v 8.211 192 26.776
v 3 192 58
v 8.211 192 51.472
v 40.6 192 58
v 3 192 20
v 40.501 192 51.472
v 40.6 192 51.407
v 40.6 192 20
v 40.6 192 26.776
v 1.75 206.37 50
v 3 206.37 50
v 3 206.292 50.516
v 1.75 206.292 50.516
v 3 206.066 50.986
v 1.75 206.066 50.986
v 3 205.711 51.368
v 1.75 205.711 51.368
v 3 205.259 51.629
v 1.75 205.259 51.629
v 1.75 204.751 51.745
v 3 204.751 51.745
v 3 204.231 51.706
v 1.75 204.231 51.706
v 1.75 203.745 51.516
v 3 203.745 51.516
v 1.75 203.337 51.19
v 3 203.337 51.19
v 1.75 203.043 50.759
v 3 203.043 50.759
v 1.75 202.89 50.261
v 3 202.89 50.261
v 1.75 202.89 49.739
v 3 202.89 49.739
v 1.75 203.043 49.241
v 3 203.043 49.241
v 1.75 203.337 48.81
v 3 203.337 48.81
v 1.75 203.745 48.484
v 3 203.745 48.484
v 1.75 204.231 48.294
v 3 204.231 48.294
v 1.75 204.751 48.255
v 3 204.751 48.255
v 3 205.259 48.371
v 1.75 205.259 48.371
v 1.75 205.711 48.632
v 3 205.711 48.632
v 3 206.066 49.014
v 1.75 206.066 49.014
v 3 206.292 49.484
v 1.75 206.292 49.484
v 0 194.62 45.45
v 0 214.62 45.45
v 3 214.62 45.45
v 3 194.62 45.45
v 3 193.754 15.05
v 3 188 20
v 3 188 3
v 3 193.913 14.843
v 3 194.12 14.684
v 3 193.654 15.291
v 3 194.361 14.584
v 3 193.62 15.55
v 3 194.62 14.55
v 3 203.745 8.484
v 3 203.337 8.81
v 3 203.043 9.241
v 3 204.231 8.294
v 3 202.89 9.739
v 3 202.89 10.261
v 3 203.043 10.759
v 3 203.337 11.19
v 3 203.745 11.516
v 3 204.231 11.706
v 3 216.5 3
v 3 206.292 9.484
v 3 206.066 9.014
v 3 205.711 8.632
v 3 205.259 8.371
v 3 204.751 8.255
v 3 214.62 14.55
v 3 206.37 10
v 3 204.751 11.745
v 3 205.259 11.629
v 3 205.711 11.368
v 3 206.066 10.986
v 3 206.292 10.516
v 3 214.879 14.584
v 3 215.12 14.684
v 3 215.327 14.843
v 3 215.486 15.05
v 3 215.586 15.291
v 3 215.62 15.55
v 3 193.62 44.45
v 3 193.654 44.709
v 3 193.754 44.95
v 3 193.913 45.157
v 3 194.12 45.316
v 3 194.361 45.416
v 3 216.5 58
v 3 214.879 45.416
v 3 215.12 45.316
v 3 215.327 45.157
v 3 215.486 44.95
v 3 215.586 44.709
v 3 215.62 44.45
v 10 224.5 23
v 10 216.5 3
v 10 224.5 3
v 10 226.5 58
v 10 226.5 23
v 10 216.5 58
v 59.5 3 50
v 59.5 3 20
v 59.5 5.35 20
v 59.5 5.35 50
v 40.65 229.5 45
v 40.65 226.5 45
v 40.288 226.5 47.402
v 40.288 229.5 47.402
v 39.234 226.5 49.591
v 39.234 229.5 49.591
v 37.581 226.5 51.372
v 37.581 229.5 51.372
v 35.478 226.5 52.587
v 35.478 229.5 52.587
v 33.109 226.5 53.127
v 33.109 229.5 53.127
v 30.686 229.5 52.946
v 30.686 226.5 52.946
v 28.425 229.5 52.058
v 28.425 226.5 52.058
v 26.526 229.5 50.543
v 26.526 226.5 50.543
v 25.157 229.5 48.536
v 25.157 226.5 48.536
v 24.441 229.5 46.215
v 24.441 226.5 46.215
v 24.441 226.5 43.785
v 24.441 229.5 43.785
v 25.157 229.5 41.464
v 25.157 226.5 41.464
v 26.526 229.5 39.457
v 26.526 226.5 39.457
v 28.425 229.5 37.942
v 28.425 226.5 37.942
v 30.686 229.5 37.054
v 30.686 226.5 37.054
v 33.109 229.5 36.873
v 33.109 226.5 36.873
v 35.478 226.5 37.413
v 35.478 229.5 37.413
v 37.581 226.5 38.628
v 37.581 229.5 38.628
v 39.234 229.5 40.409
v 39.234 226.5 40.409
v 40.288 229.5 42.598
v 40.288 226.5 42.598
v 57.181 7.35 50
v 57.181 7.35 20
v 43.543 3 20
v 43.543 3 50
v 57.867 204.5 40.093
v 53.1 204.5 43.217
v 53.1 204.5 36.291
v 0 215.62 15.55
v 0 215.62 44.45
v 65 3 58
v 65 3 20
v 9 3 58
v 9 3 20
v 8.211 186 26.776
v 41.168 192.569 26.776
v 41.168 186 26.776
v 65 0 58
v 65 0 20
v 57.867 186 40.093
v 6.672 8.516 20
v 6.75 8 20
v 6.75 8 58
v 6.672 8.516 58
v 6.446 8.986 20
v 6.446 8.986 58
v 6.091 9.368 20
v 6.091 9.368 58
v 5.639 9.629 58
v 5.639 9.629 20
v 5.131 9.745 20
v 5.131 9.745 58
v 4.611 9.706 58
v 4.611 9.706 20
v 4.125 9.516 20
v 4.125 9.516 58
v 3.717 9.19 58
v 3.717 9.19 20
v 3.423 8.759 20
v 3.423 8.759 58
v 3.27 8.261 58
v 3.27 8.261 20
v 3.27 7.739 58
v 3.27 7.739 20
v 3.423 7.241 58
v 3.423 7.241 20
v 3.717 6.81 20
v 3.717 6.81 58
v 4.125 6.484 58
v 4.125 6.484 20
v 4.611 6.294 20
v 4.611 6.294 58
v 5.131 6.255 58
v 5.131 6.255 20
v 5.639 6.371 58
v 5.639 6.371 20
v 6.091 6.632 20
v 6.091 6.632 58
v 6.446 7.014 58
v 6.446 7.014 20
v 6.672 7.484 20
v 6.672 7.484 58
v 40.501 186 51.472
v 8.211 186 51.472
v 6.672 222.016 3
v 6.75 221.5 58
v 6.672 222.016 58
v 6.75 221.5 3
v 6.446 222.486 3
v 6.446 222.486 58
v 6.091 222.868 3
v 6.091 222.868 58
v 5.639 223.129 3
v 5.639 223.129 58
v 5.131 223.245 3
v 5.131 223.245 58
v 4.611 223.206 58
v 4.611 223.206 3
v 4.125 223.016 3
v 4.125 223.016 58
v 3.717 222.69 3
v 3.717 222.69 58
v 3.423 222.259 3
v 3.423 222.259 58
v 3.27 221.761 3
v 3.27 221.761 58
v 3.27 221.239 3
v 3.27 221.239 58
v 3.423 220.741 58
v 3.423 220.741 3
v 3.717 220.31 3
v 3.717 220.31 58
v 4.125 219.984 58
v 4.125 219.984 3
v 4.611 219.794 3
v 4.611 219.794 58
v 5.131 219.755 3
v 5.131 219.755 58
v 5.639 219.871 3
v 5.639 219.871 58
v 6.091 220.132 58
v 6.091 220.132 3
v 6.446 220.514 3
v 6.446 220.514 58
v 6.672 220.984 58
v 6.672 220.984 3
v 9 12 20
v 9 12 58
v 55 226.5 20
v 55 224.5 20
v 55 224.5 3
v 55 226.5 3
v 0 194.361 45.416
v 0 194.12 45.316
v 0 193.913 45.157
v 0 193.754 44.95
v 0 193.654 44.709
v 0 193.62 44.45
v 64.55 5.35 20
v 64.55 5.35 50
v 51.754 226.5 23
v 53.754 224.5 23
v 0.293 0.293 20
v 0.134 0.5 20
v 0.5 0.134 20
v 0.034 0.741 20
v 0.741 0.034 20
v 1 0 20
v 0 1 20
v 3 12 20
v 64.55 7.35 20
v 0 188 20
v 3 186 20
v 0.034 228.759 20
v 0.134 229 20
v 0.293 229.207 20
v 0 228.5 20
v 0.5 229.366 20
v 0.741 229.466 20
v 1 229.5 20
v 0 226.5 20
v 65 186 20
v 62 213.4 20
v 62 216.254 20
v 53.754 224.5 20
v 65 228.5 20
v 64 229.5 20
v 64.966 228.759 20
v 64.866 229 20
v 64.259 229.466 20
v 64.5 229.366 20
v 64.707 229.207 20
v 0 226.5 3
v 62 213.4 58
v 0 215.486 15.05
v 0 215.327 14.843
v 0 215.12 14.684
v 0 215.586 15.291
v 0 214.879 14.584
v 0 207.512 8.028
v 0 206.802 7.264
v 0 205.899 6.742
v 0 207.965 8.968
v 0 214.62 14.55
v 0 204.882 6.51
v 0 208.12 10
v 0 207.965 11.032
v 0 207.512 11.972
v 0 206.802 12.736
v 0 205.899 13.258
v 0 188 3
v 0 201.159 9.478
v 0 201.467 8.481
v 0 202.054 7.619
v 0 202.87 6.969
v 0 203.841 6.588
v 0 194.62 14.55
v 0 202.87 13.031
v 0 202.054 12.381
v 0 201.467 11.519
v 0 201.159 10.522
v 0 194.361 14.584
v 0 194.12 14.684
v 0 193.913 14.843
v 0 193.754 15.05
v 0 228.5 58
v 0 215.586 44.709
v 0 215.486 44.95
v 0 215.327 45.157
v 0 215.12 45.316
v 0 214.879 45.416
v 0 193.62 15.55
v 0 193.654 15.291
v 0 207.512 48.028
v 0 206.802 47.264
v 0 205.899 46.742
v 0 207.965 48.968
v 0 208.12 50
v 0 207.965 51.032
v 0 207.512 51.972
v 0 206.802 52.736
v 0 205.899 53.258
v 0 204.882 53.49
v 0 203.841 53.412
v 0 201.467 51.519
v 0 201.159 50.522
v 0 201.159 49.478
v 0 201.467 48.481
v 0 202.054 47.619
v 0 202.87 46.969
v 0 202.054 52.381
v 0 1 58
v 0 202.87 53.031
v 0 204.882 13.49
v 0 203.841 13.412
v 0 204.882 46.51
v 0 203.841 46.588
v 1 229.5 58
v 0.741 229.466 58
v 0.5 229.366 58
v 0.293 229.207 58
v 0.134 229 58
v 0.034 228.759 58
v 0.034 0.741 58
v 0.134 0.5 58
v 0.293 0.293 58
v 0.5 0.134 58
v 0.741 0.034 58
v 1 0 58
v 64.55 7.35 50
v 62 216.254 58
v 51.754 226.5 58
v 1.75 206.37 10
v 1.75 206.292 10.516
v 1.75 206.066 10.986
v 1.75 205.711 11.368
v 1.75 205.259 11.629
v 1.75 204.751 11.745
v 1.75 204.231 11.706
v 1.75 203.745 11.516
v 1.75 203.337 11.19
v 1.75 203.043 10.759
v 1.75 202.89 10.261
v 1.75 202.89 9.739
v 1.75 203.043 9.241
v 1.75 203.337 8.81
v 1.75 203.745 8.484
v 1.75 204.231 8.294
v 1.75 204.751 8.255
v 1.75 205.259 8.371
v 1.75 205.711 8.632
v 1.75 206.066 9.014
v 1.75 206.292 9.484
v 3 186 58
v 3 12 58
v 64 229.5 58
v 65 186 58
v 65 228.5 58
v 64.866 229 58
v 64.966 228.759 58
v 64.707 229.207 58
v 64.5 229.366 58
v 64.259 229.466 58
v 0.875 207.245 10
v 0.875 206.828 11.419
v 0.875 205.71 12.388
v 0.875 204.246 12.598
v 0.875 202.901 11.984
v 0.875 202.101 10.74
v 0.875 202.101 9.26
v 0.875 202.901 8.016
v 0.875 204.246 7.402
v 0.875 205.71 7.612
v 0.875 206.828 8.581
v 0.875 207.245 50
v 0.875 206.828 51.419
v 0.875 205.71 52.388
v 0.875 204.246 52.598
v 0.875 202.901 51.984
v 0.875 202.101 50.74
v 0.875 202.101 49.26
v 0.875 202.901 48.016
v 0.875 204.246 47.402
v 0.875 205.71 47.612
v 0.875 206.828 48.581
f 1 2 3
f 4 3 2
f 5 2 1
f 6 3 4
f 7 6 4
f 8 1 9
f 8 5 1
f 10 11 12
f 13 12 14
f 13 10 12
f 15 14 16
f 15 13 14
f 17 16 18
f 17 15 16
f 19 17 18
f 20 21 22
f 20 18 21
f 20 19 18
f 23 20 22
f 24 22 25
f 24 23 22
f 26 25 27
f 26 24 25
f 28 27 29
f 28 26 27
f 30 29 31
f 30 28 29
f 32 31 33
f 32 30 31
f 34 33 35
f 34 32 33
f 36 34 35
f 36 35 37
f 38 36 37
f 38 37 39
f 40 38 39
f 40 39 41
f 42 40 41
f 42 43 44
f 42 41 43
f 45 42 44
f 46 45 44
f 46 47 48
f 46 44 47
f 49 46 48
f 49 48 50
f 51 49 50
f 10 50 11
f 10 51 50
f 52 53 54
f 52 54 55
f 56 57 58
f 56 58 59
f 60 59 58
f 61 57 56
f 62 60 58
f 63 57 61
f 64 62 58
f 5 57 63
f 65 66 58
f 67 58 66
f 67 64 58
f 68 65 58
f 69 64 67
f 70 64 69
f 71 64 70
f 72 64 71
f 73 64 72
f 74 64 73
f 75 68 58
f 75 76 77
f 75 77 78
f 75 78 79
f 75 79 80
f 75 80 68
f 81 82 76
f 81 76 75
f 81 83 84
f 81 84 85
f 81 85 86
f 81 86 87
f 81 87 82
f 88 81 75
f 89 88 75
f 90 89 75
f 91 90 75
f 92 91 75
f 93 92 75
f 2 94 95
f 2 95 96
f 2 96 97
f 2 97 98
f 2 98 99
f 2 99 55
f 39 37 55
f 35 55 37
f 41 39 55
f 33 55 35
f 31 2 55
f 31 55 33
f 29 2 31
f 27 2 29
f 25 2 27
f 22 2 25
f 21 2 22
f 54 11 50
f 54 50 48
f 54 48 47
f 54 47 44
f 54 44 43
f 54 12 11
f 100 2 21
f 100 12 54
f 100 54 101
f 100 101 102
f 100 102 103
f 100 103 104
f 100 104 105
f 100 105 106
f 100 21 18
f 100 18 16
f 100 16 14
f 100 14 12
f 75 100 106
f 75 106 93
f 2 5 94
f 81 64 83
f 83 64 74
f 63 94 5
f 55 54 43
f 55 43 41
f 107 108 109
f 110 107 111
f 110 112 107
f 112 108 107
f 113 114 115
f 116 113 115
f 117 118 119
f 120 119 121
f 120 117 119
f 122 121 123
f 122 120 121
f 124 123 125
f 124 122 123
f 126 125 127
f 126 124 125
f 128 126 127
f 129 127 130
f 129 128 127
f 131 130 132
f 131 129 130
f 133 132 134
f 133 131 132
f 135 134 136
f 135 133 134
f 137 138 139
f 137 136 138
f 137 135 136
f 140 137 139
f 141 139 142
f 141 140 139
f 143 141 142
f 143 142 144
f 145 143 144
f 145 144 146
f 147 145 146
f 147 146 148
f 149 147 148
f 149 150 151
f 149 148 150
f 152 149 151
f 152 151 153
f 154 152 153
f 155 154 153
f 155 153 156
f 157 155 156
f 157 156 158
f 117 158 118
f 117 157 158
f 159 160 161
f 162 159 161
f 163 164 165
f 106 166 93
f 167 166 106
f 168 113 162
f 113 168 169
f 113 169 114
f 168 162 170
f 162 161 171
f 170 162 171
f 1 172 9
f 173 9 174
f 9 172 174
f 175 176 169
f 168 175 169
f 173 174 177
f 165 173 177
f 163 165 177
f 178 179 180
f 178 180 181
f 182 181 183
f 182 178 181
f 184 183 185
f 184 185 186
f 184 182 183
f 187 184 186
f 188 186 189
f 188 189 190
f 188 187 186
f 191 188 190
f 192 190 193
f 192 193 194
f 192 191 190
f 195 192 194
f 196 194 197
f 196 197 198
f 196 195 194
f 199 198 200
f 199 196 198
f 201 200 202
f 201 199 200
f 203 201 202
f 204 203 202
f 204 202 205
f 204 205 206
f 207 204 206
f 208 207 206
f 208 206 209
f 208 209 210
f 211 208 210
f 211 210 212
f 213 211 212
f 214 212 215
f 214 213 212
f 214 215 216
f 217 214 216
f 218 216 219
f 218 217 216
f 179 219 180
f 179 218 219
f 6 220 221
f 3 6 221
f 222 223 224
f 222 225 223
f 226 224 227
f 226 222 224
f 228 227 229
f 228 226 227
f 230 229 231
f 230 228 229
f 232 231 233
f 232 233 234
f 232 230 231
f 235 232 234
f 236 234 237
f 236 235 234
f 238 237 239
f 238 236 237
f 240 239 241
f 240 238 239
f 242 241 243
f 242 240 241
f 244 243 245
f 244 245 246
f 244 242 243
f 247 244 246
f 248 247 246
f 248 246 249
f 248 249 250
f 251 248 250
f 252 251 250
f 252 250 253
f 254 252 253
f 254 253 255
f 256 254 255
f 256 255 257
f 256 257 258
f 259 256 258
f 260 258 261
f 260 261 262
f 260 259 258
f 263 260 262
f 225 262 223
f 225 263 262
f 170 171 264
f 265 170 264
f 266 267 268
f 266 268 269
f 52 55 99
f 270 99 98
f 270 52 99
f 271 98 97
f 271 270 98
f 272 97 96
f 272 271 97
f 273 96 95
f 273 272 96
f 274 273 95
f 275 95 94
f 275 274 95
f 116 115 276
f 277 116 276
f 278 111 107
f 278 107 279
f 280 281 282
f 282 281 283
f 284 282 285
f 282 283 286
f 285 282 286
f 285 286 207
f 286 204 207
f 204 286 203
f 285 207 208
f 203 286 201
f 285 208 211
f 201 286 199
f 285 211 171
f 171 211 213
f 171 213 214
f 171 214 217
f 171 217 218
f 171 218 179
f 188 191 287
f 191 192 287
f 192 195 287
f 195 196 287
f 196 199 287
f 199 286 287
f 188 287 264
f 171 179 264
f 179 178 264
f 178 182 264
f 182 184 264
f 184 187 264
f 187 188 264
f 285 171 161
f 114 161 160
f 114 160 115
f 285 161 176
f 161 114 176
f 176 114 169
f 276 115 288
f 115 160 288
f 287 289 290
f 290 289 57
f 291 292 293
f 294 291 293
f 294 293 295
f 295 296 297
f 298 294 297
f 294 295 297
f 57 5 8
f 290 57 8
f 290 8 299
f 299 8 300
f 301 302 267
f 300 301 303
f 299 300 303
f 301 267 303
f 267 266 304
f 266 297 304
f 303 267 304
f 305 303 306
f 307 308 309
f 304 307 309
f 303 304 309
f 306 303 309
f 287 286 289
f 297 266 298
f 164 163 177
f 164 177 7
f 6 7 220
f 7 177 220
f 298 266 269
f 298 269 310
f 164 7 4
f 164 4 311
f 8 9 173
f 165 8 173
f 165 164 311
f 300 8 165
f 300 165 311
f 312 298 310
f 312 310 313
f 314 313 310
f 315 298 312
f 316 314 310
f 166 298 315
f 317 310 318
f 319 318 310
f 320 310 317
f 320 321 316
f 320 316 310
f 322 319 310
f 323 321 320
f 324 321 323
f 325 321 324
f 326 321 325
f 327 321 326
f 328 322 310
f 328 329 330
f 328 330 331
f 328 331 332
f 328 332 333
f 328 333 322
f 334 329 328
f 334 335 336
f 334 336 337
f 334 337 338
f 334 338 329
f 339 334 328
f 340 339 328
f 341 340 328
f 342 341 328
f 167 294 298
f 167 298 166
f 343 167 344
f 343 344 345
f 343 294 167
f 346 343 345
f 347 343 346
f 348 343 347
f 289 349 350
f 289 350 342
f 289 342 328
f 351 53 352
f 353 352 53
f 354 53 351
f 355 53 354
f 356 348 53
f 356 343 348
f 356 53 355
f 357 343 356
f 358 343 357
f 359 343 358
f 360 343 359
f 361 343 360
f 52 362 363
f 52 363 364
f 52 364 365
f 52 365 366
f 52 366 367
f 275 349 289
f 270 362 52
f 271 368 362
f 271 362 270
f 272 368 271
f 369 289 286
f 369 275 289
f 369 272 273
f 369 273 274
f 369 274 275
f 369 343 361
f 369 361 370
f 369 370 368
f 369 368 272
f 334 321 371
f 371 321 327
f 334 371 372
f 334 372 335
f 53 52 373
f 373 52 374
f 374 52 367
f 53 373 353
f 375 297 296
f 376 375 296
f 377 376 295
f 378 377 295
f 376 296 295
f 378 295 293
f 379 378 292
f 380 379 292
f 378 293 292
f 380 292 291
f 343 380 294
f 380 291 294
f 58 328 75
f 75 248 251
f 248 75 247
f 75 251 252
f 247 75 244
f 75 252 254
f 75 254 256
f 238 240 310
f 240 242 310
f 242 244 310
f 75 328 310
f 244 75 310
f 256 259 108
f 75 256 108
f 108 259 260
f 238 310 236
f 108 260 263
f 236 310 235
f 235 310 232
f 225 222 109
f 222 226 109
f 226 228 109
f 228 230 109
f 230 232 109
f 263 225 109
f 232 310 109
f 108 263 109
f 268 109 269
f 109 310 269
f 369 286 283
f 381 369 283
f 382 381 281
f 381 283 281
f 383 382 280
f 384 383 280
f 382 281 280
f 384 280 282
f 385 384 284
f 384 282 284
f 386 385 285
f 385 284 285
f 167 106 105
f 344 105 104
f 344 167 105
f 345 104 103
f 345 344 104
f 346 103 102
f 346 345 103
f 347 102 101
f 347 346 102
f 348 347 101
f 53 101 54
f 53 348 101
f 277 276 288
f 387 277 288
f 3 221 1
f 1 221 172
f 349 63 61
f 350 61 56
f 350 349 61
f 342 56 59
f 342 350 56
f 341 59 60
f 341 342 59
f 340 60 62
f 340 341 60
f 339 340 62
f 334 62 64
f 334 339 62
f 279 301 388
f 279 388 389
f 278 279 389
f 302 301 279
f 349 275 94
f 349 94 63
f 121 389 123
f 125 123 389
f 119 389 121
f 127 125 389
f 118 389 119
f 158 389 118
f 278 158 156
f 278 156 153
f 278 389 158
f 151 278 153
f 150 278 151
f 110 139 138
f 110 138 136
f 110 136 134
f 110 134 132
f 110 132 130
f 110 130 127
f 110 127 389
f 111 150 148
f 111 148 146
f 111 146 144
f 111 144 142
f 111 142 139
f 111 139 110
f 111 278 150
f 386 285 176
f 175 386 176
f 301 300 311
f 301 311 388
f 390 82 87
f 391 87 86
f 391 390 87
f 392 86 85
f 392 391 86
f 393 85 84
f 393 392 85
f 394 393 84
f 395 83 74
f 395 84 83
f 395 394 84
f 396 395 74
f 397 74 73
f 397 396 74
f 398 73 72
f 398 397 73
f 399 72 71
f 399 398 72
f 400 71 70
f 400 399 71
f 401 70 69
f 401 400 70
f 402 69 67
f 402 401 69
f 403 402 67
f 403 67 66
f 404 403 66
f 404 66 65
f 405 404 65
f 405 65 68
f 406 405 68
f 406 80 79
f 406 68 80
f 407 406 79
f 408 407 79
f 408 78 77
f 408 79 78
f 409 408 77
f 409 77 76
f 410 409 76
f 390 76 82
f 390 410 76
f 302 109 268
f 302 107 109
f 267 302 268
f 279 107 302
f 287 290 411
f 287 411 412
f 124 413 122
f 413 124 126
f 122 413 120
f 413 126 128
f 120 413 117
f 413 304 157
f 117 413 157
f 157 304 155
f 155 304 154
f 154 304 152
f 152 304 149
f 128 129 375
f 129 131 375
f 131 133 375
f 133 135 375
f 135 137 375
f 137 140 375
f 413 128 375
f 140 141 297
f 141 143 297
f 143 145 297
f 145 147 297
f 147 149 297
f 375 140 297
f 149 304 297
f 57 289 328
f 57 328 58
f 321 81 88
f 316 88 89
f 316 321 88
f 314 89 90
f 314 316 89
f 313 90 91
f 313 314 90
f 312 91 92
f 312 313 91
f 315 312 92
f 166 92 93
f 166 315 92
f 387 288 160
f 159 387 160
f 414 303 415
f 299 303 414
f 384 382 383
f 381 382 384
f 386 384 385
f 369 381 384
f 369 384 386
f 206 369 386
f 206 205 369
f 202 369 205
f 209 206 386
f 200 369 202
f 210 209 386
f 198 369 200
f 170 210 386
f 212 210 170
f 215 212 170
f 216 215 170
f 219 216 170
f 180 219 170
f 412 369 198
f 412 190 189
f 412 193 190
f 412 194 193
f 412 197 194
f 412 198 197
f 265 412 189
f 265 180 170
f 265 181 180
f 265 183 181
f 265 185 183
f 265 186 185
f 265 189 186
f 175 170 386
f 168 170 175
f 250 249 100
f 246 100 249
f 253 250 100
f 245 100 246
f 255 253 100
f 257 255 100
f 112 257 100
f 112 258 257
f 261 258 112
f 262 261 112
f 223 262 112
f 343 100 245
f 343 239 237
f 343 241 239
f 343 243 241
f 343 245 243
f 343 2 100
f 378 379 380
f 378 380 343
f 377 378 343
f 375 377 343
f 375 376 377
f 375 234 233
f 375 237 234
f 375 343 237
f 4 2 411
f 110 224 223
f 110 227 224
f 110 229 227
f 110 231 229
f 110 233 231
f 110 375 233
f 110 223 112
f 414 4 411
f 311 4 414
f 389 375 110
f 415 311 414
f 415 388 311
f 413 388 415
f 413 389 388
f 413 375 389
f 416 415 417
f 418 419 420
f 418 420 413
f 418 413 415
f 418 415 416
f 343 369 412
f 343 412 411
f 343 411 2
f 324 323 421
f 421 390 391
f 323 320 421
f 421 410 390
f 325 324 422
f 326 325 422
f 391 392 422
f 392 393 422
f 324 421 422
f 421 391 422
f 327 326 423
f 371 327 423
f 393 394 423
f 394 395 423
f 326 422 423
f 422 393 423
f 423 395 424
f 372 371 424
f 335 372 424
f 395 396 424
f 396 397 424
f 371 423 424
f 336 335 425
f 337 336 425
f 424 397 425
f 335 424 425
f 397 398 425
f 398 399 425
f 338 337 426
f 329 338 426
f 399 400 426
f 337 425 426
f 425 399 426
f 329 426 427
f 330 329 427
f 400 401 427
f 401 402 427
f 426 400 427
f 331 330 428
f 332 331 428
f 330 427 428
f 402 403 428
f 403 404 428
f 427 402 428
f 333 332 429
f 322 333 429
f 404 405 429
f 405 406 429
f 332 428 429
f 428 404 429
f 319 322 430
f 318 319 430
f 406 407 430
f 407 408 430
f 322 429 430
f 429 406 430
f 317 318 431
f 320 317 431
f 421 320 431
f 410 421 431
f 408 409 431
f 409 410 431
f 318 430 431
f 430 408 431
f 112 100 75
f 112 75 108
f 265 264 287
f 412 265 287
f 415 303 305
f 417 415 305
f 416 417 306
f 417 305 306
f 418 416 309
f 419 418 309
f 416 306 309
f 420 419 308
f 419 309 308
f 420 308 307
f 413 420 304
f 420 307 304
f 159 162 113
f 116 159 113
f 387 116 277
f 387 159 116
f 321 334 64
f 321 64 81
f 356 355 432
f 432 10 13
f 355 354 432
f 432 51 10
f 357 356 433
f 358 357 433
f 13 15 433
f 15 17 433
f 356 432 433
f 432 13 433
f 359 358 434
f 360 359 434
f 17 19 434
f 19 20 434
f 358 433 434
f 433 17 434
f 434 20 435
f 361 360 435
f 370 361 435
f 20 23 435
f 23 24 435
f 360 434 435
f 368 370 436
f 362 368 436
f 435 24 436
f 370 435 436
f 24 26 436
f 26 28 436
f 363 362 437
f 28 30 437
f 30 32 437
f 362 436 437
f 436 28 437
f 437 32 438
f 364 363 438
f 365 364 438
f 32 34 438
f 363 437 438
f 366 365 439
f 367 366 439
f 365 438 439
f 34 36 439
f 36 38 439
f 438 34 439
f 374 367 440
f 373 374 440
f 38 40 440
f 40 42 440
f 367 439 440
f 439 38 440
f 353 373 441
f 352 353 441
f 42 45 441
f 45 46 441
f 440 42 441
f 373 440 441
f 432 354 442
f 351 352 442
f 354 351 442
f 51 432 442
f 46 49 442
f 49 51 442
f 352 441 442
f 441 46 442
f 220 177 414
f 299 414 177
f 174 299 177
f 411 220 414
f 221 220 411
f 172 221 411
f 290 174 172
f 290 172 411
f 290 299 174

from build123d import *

# Parameters (mm, degrees)
SKETCH068_R     = 1.75
PAD032_DEPTH    = 38
SKETCH069_R     = 1.75
PAD033_DEPTH    = 17
PAD034_DEPTH    = 3
SKETCH070_R     = 1.75
POCKET031_DEPTH = 5
SKETCH072_R     = 8.15
POCKET033_DEPTH = 5
POCKET034_DEPTH = 16.5
CHAMFER007_SIZE = 1.75
PAD050_DEPTH    = 30


with BuildPart() as part:
    # Sketch068 (on DatumPlane) → Pad032 (new body)
    with BuildSketch(Plane.XY.offset(20)):
        with BuildLine():
            Line((1, 0), (65, 0))
            Line((65, 0), (65, 3))
            Line((65, 3), (9, 3))
            Line((9, 3), (9, 12))
            Line((9, 12), (3, 12))
            Line((3, 186), (3, 12))
            Line((65, 186), (3, 186))
            Line((65, 228.5), (65, 186))
            ThreePointArc((65, 228.5), (64.707107, 229.207107), (64, 229.5))
            Line((64, 229.5), (1, 229.5))
            ThreePointArc((1, 229.5), (0.292893, 229.207107), (0, 228.5))
            Line((0, 228.5), (0, 1))
            ThreePointArc((0, 1), (0.292893, 0.292893), (1, 0))
        make_face()
        with Locations((5, 8)):
            Circle(SKETCH068_R, mode=Mode.SUBTRACT)
        with Locations((5, 221.5)):
            Circle(SKETCH068_R, mode=Mode.SUBTRACT)
        Polygon((3, 192), (40.599928, 192), (62, 213.400072), (62, 216.254001), (51.754001, 226.5), (10, 226.5), (10, 216.5), (3, 216.5), align=None, mode=Mode.SUBTRACT)
    extrude(amount=PAD032_DEPTH)

    # Sketch069 (on DatumPlane) → Pad033 (join)
    with BuildSketch(Plane.XY.offset(20)):
        Polygon((0, 226.5), (0, 188), (3, 188), (3, 216.5), (10, 216.5), (10, 224.5), (55, 224.5), (55, 226.5), (10, 226.5), align=None)
        with Locations((5, 221.5)):
            Circle(SKETCH069_R, mode=Mode.SUBTRACT)
    extrude(amount=-PAD033_DEPTH)

    # Sketch069 (on DatumPlane) → Pad034 (join)
    with BuildSketch(Plane.XY.offset(20)):
        Polygon((0, 226.5), (0, 188), (3, 188), (3, 216.5), (10, 216.5), (10, 224.5), (55, 224.5), (55, 226.5), (10, 226.5), align=None)
        with Locations((5, 221.5)):
            Circle(SKETCH069_R, mode=Mode.SUBTRACT)
    extrude(amount=PAD034_DEPTH)

    # Sketch070 → Pocket031 (cut)
    with BuildSketch(Plane.YZ):
        with Locations((204.62, 50)):
            Circle(SKETCH070_R)
        with Locations((204.62, 10)):
            Circle(SKETCH070_R)
        with BuildLine():
            Line((194.62, 14.55), (214.62, 14.55))
            ThreePointArc((214.62, 14.55), (215.327107, 14.842893), (215.62, 15.55))
            Line((215.62, 15.55), (215.62, 44.45))
            ThreePointArc((215.62, 44.45), (215.327107, 45.157107), (214.62, 45.45))
            Line((214.62, 45.45), (194.62, 45.45))
            ThreePointArc((194.62, 45.45), (193.912893, 45.157107), (193.62, 44.45))
            Line((193.62, 44.45), (193.62, 15.55))
            ThreePointArc((193.62, 15.55), (193.912893, 14.842893), (194.62, 14.55))
        make_face()
    extrude(amount=POCKET031_DEPTH, mode=Mode.SUBTRACT)

    # Sketch072 (on DatumPlane) → Pocket033 (cut)
    with BuildSketch(Plane.XZ.offset(-229.5)):
        with Locations((32.5, 45)):
            Circle(SKETCH072_R)
    extrude(amount=POCKET033_DEPTH, mode=Mode.SUBTRACT)

    # Sketch073 (on DatumPlane) → Pocket034 (cut, symmetric)
    with BuildSketch(Plane.XZ.offset(-188)):
        Polygon((8.211473, 51.471827), (8.211473, 26.775664), (41.168469, 26.775664), (57.867441, 40.093213), (40.500886, 51.471827), align=None)
    extrude(amount=POCKET034_DEPTH, both=True, mode=Mode.SUBTRACT)

    # Chamfer007
    chamfer007_edges = [part.edges().sort_by_distance(p)[0] for p in [
        (0, 202.87, 50),
        (0, 202.87, 10),
    ]]
    chamfer(chamfer007_edges, length=CHAMFER007_SIZE)

    # Sketch092 (on DatumPlane) → Pad050 (join)
    with BuildSketch(Plane.XY.offset(20)):
        Polygon((59.5, 2.95), (59.5, 5.35), (64.550262, 5.35), (64.550262, 7.35), (57.181149, 7.35), (43.385918, 2.95), align=None)
    extrude(amount=PAD050_DEPTH)


solid = part.part
